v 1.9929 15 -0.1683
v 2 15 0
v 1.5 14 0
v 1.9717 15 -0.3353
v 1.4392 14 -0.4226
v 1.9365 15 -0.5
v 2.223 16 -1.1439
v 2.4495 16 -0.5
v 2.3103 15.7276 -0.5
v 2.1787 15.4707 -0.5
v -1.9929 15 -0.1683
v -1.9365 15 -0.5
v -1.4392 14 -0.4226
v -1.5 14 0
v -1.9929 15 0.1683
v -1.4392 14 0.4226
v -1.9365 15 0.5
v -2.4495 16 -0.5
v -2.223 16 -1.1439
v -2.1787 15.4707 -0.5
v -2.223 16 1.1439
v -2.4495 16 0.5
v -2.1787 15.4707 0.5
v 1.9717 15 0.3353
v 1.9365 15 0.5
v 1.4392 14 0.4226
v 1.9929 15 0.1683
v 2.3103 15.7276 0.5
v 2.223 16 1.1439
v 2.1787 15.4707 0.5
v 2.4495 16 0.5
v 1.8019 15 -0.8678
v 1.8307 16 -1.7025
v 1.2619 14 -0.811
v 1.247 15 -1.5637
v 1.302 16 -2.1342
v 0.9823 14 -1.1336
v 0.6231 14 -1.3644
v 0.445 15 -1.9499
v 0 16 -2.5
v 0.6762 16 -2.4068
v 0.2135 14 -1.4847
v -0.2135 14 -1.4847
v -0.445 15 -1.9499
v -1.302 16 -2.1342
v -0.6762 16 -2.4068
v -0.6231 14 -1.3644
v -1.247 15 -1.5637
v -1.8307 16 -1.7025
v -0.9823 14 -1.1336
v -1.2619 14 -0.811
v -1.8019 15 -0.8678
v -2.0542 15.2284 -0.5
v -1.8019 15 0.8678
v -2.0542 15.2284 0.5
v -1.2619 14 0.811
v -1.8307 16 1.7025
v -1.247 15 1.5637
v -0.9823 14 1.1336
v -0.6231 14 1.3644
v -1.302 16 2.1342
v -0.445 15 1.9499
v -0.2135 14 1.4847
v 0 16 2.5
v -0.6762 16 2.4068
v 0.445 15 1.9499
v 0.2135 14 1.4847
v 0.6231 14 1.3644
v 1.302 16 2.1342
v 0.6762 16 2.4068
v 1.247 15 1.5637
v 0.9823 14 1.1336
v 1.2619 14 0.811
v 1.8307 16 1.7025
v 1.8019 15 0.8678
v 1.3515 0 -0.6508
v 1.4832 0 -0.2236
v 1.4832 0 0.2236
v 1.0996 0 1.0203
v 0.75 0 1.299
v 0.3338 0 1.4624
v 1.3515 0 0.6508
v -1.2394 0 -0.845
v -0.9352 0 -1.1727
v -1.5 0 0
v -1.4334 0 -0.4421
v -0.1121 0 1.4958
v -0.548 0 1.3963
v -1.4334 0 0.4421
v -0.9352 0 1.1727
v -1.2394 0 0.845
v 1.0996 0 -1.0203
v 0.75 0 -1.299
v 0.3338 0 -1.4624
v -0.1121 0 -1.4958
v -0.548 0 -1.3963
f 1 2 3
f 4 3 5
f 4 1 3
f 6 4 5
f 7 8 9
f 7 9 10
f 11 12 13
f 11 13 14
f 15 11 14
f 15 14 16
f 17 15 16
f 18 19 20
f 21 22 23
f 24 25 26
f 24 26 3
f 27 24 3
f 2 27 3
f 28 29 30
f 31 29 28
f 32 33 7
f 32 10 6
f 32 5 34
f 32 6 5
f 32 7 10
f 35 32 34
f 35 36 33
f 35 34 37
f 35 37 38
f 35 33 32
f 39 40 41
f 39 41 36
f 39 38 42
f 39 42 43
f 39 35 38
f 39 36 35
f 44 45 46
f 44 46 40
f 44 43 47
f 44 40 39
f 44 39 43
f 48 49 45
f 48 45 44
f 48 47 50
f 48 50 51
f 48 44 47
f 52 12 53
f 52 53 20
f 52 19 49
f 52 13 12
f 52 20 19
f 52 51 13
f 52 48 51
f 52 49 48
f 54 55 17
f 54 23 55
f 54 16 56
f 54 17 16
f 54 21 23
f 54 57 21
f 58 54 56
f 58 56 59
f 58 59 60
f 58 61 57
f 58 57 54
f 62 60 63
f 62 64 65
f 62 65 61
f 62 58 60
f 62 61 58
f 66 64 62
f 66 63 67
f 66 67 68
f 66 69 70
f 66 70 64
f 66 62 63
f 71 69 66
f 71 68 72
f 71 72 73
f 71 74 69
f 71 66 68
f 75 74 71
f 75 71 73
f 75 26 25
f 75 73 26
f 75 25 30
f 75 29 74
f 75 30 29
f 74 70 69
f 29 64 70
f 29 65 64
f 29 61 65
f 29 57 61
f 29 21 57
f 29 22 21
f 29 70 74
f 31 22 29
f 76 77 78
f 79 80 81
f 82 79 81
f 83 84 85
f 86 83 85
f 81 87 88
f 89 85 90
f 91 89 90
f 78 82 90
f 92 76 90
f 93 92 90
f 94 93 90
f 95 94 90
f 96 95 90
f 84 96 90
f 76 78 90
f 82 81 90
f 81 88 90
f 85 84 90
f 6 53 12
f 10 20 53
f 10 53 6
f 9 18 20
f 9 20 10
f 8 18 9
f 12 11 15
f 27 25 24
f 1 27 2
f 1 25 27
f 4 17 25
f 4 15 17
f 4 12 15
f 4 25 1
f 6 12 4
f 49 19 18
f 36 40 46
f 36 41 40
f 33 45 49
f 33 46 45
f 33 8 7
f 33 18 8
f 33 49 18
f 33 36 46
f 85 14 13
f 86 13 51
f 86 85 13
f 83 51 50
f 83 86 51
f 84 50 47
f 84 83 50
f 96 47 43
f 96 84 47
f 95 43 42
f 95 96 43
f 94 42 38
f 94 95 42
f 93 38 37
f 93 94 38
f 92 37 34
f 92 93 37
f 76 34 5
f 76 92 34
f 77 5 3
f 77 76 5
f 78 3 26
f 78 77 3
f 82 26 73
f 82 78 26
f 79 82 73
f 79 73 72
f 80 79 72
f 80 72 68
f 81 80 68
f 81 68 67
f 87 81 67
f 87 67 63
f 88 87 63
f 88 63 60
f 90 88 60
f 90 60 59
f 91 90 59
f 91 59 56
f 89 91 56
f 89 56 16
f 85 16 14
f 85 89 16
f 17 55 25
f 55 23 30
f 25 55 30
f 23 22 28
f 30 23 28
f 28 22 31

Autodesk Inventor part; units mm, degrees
ref_plane "YZ Plane" through (0, 0, 0) normal (1, 0, 0) x (0, 1, 0)
ref_plane "XZ Plane" through (0, 0, 0) normal (0, 1, 0) x (-1, 0, 0)
sketch "Sketch1" plane through (0, 0, 0) normal (0, 1, 0) x (-1, 0, 0)
  circle A0 centre (0, 0) radius 1.5
  dimension "d0" = 3
extrude "Extrusion1" add sketch "Sketch1" along normal blind 14
thread "Thread1" size "M3x0.5" class "6g" standard "ANSI Metric M Profile" full length
ref_plane "Work Plane1" through (0, 16, 0) normal (0, 1, 0) x (1, 0, 0)
sketch "Sketch4" plane through (0, 16, 0) normal (0, 1, 0) x (1, 0, 0)
  circle A0 centre (0, 0) radius 2.5
  dimension "d14" = 5
loft "Loft1" add profiles "Sketch4" section 2 edges at (1.5, 14, 0)
sketch "Sketch5" plane through (0, 16, 0) normal (0, 1, 0) x (1, 0, 0)
  circle A0 centre (0, 0) radius 2.5 projected
  line L0 (-2.4495, 0.5) -> (2.4495, 0.5)
  line L1 (-2.4495, -0.5) -> (2.4495, -0.5)
  line L2 (0, 0) -> (2.0973, 0) construction
  dimension "d19" = 1
extrude "Extrusion4" cut sketch "Sketch5" against normal blind 1 contours A0 L1 L0
properties part number "Screw_CountersunkHead_3x16" material "Steel, Galvanized"
